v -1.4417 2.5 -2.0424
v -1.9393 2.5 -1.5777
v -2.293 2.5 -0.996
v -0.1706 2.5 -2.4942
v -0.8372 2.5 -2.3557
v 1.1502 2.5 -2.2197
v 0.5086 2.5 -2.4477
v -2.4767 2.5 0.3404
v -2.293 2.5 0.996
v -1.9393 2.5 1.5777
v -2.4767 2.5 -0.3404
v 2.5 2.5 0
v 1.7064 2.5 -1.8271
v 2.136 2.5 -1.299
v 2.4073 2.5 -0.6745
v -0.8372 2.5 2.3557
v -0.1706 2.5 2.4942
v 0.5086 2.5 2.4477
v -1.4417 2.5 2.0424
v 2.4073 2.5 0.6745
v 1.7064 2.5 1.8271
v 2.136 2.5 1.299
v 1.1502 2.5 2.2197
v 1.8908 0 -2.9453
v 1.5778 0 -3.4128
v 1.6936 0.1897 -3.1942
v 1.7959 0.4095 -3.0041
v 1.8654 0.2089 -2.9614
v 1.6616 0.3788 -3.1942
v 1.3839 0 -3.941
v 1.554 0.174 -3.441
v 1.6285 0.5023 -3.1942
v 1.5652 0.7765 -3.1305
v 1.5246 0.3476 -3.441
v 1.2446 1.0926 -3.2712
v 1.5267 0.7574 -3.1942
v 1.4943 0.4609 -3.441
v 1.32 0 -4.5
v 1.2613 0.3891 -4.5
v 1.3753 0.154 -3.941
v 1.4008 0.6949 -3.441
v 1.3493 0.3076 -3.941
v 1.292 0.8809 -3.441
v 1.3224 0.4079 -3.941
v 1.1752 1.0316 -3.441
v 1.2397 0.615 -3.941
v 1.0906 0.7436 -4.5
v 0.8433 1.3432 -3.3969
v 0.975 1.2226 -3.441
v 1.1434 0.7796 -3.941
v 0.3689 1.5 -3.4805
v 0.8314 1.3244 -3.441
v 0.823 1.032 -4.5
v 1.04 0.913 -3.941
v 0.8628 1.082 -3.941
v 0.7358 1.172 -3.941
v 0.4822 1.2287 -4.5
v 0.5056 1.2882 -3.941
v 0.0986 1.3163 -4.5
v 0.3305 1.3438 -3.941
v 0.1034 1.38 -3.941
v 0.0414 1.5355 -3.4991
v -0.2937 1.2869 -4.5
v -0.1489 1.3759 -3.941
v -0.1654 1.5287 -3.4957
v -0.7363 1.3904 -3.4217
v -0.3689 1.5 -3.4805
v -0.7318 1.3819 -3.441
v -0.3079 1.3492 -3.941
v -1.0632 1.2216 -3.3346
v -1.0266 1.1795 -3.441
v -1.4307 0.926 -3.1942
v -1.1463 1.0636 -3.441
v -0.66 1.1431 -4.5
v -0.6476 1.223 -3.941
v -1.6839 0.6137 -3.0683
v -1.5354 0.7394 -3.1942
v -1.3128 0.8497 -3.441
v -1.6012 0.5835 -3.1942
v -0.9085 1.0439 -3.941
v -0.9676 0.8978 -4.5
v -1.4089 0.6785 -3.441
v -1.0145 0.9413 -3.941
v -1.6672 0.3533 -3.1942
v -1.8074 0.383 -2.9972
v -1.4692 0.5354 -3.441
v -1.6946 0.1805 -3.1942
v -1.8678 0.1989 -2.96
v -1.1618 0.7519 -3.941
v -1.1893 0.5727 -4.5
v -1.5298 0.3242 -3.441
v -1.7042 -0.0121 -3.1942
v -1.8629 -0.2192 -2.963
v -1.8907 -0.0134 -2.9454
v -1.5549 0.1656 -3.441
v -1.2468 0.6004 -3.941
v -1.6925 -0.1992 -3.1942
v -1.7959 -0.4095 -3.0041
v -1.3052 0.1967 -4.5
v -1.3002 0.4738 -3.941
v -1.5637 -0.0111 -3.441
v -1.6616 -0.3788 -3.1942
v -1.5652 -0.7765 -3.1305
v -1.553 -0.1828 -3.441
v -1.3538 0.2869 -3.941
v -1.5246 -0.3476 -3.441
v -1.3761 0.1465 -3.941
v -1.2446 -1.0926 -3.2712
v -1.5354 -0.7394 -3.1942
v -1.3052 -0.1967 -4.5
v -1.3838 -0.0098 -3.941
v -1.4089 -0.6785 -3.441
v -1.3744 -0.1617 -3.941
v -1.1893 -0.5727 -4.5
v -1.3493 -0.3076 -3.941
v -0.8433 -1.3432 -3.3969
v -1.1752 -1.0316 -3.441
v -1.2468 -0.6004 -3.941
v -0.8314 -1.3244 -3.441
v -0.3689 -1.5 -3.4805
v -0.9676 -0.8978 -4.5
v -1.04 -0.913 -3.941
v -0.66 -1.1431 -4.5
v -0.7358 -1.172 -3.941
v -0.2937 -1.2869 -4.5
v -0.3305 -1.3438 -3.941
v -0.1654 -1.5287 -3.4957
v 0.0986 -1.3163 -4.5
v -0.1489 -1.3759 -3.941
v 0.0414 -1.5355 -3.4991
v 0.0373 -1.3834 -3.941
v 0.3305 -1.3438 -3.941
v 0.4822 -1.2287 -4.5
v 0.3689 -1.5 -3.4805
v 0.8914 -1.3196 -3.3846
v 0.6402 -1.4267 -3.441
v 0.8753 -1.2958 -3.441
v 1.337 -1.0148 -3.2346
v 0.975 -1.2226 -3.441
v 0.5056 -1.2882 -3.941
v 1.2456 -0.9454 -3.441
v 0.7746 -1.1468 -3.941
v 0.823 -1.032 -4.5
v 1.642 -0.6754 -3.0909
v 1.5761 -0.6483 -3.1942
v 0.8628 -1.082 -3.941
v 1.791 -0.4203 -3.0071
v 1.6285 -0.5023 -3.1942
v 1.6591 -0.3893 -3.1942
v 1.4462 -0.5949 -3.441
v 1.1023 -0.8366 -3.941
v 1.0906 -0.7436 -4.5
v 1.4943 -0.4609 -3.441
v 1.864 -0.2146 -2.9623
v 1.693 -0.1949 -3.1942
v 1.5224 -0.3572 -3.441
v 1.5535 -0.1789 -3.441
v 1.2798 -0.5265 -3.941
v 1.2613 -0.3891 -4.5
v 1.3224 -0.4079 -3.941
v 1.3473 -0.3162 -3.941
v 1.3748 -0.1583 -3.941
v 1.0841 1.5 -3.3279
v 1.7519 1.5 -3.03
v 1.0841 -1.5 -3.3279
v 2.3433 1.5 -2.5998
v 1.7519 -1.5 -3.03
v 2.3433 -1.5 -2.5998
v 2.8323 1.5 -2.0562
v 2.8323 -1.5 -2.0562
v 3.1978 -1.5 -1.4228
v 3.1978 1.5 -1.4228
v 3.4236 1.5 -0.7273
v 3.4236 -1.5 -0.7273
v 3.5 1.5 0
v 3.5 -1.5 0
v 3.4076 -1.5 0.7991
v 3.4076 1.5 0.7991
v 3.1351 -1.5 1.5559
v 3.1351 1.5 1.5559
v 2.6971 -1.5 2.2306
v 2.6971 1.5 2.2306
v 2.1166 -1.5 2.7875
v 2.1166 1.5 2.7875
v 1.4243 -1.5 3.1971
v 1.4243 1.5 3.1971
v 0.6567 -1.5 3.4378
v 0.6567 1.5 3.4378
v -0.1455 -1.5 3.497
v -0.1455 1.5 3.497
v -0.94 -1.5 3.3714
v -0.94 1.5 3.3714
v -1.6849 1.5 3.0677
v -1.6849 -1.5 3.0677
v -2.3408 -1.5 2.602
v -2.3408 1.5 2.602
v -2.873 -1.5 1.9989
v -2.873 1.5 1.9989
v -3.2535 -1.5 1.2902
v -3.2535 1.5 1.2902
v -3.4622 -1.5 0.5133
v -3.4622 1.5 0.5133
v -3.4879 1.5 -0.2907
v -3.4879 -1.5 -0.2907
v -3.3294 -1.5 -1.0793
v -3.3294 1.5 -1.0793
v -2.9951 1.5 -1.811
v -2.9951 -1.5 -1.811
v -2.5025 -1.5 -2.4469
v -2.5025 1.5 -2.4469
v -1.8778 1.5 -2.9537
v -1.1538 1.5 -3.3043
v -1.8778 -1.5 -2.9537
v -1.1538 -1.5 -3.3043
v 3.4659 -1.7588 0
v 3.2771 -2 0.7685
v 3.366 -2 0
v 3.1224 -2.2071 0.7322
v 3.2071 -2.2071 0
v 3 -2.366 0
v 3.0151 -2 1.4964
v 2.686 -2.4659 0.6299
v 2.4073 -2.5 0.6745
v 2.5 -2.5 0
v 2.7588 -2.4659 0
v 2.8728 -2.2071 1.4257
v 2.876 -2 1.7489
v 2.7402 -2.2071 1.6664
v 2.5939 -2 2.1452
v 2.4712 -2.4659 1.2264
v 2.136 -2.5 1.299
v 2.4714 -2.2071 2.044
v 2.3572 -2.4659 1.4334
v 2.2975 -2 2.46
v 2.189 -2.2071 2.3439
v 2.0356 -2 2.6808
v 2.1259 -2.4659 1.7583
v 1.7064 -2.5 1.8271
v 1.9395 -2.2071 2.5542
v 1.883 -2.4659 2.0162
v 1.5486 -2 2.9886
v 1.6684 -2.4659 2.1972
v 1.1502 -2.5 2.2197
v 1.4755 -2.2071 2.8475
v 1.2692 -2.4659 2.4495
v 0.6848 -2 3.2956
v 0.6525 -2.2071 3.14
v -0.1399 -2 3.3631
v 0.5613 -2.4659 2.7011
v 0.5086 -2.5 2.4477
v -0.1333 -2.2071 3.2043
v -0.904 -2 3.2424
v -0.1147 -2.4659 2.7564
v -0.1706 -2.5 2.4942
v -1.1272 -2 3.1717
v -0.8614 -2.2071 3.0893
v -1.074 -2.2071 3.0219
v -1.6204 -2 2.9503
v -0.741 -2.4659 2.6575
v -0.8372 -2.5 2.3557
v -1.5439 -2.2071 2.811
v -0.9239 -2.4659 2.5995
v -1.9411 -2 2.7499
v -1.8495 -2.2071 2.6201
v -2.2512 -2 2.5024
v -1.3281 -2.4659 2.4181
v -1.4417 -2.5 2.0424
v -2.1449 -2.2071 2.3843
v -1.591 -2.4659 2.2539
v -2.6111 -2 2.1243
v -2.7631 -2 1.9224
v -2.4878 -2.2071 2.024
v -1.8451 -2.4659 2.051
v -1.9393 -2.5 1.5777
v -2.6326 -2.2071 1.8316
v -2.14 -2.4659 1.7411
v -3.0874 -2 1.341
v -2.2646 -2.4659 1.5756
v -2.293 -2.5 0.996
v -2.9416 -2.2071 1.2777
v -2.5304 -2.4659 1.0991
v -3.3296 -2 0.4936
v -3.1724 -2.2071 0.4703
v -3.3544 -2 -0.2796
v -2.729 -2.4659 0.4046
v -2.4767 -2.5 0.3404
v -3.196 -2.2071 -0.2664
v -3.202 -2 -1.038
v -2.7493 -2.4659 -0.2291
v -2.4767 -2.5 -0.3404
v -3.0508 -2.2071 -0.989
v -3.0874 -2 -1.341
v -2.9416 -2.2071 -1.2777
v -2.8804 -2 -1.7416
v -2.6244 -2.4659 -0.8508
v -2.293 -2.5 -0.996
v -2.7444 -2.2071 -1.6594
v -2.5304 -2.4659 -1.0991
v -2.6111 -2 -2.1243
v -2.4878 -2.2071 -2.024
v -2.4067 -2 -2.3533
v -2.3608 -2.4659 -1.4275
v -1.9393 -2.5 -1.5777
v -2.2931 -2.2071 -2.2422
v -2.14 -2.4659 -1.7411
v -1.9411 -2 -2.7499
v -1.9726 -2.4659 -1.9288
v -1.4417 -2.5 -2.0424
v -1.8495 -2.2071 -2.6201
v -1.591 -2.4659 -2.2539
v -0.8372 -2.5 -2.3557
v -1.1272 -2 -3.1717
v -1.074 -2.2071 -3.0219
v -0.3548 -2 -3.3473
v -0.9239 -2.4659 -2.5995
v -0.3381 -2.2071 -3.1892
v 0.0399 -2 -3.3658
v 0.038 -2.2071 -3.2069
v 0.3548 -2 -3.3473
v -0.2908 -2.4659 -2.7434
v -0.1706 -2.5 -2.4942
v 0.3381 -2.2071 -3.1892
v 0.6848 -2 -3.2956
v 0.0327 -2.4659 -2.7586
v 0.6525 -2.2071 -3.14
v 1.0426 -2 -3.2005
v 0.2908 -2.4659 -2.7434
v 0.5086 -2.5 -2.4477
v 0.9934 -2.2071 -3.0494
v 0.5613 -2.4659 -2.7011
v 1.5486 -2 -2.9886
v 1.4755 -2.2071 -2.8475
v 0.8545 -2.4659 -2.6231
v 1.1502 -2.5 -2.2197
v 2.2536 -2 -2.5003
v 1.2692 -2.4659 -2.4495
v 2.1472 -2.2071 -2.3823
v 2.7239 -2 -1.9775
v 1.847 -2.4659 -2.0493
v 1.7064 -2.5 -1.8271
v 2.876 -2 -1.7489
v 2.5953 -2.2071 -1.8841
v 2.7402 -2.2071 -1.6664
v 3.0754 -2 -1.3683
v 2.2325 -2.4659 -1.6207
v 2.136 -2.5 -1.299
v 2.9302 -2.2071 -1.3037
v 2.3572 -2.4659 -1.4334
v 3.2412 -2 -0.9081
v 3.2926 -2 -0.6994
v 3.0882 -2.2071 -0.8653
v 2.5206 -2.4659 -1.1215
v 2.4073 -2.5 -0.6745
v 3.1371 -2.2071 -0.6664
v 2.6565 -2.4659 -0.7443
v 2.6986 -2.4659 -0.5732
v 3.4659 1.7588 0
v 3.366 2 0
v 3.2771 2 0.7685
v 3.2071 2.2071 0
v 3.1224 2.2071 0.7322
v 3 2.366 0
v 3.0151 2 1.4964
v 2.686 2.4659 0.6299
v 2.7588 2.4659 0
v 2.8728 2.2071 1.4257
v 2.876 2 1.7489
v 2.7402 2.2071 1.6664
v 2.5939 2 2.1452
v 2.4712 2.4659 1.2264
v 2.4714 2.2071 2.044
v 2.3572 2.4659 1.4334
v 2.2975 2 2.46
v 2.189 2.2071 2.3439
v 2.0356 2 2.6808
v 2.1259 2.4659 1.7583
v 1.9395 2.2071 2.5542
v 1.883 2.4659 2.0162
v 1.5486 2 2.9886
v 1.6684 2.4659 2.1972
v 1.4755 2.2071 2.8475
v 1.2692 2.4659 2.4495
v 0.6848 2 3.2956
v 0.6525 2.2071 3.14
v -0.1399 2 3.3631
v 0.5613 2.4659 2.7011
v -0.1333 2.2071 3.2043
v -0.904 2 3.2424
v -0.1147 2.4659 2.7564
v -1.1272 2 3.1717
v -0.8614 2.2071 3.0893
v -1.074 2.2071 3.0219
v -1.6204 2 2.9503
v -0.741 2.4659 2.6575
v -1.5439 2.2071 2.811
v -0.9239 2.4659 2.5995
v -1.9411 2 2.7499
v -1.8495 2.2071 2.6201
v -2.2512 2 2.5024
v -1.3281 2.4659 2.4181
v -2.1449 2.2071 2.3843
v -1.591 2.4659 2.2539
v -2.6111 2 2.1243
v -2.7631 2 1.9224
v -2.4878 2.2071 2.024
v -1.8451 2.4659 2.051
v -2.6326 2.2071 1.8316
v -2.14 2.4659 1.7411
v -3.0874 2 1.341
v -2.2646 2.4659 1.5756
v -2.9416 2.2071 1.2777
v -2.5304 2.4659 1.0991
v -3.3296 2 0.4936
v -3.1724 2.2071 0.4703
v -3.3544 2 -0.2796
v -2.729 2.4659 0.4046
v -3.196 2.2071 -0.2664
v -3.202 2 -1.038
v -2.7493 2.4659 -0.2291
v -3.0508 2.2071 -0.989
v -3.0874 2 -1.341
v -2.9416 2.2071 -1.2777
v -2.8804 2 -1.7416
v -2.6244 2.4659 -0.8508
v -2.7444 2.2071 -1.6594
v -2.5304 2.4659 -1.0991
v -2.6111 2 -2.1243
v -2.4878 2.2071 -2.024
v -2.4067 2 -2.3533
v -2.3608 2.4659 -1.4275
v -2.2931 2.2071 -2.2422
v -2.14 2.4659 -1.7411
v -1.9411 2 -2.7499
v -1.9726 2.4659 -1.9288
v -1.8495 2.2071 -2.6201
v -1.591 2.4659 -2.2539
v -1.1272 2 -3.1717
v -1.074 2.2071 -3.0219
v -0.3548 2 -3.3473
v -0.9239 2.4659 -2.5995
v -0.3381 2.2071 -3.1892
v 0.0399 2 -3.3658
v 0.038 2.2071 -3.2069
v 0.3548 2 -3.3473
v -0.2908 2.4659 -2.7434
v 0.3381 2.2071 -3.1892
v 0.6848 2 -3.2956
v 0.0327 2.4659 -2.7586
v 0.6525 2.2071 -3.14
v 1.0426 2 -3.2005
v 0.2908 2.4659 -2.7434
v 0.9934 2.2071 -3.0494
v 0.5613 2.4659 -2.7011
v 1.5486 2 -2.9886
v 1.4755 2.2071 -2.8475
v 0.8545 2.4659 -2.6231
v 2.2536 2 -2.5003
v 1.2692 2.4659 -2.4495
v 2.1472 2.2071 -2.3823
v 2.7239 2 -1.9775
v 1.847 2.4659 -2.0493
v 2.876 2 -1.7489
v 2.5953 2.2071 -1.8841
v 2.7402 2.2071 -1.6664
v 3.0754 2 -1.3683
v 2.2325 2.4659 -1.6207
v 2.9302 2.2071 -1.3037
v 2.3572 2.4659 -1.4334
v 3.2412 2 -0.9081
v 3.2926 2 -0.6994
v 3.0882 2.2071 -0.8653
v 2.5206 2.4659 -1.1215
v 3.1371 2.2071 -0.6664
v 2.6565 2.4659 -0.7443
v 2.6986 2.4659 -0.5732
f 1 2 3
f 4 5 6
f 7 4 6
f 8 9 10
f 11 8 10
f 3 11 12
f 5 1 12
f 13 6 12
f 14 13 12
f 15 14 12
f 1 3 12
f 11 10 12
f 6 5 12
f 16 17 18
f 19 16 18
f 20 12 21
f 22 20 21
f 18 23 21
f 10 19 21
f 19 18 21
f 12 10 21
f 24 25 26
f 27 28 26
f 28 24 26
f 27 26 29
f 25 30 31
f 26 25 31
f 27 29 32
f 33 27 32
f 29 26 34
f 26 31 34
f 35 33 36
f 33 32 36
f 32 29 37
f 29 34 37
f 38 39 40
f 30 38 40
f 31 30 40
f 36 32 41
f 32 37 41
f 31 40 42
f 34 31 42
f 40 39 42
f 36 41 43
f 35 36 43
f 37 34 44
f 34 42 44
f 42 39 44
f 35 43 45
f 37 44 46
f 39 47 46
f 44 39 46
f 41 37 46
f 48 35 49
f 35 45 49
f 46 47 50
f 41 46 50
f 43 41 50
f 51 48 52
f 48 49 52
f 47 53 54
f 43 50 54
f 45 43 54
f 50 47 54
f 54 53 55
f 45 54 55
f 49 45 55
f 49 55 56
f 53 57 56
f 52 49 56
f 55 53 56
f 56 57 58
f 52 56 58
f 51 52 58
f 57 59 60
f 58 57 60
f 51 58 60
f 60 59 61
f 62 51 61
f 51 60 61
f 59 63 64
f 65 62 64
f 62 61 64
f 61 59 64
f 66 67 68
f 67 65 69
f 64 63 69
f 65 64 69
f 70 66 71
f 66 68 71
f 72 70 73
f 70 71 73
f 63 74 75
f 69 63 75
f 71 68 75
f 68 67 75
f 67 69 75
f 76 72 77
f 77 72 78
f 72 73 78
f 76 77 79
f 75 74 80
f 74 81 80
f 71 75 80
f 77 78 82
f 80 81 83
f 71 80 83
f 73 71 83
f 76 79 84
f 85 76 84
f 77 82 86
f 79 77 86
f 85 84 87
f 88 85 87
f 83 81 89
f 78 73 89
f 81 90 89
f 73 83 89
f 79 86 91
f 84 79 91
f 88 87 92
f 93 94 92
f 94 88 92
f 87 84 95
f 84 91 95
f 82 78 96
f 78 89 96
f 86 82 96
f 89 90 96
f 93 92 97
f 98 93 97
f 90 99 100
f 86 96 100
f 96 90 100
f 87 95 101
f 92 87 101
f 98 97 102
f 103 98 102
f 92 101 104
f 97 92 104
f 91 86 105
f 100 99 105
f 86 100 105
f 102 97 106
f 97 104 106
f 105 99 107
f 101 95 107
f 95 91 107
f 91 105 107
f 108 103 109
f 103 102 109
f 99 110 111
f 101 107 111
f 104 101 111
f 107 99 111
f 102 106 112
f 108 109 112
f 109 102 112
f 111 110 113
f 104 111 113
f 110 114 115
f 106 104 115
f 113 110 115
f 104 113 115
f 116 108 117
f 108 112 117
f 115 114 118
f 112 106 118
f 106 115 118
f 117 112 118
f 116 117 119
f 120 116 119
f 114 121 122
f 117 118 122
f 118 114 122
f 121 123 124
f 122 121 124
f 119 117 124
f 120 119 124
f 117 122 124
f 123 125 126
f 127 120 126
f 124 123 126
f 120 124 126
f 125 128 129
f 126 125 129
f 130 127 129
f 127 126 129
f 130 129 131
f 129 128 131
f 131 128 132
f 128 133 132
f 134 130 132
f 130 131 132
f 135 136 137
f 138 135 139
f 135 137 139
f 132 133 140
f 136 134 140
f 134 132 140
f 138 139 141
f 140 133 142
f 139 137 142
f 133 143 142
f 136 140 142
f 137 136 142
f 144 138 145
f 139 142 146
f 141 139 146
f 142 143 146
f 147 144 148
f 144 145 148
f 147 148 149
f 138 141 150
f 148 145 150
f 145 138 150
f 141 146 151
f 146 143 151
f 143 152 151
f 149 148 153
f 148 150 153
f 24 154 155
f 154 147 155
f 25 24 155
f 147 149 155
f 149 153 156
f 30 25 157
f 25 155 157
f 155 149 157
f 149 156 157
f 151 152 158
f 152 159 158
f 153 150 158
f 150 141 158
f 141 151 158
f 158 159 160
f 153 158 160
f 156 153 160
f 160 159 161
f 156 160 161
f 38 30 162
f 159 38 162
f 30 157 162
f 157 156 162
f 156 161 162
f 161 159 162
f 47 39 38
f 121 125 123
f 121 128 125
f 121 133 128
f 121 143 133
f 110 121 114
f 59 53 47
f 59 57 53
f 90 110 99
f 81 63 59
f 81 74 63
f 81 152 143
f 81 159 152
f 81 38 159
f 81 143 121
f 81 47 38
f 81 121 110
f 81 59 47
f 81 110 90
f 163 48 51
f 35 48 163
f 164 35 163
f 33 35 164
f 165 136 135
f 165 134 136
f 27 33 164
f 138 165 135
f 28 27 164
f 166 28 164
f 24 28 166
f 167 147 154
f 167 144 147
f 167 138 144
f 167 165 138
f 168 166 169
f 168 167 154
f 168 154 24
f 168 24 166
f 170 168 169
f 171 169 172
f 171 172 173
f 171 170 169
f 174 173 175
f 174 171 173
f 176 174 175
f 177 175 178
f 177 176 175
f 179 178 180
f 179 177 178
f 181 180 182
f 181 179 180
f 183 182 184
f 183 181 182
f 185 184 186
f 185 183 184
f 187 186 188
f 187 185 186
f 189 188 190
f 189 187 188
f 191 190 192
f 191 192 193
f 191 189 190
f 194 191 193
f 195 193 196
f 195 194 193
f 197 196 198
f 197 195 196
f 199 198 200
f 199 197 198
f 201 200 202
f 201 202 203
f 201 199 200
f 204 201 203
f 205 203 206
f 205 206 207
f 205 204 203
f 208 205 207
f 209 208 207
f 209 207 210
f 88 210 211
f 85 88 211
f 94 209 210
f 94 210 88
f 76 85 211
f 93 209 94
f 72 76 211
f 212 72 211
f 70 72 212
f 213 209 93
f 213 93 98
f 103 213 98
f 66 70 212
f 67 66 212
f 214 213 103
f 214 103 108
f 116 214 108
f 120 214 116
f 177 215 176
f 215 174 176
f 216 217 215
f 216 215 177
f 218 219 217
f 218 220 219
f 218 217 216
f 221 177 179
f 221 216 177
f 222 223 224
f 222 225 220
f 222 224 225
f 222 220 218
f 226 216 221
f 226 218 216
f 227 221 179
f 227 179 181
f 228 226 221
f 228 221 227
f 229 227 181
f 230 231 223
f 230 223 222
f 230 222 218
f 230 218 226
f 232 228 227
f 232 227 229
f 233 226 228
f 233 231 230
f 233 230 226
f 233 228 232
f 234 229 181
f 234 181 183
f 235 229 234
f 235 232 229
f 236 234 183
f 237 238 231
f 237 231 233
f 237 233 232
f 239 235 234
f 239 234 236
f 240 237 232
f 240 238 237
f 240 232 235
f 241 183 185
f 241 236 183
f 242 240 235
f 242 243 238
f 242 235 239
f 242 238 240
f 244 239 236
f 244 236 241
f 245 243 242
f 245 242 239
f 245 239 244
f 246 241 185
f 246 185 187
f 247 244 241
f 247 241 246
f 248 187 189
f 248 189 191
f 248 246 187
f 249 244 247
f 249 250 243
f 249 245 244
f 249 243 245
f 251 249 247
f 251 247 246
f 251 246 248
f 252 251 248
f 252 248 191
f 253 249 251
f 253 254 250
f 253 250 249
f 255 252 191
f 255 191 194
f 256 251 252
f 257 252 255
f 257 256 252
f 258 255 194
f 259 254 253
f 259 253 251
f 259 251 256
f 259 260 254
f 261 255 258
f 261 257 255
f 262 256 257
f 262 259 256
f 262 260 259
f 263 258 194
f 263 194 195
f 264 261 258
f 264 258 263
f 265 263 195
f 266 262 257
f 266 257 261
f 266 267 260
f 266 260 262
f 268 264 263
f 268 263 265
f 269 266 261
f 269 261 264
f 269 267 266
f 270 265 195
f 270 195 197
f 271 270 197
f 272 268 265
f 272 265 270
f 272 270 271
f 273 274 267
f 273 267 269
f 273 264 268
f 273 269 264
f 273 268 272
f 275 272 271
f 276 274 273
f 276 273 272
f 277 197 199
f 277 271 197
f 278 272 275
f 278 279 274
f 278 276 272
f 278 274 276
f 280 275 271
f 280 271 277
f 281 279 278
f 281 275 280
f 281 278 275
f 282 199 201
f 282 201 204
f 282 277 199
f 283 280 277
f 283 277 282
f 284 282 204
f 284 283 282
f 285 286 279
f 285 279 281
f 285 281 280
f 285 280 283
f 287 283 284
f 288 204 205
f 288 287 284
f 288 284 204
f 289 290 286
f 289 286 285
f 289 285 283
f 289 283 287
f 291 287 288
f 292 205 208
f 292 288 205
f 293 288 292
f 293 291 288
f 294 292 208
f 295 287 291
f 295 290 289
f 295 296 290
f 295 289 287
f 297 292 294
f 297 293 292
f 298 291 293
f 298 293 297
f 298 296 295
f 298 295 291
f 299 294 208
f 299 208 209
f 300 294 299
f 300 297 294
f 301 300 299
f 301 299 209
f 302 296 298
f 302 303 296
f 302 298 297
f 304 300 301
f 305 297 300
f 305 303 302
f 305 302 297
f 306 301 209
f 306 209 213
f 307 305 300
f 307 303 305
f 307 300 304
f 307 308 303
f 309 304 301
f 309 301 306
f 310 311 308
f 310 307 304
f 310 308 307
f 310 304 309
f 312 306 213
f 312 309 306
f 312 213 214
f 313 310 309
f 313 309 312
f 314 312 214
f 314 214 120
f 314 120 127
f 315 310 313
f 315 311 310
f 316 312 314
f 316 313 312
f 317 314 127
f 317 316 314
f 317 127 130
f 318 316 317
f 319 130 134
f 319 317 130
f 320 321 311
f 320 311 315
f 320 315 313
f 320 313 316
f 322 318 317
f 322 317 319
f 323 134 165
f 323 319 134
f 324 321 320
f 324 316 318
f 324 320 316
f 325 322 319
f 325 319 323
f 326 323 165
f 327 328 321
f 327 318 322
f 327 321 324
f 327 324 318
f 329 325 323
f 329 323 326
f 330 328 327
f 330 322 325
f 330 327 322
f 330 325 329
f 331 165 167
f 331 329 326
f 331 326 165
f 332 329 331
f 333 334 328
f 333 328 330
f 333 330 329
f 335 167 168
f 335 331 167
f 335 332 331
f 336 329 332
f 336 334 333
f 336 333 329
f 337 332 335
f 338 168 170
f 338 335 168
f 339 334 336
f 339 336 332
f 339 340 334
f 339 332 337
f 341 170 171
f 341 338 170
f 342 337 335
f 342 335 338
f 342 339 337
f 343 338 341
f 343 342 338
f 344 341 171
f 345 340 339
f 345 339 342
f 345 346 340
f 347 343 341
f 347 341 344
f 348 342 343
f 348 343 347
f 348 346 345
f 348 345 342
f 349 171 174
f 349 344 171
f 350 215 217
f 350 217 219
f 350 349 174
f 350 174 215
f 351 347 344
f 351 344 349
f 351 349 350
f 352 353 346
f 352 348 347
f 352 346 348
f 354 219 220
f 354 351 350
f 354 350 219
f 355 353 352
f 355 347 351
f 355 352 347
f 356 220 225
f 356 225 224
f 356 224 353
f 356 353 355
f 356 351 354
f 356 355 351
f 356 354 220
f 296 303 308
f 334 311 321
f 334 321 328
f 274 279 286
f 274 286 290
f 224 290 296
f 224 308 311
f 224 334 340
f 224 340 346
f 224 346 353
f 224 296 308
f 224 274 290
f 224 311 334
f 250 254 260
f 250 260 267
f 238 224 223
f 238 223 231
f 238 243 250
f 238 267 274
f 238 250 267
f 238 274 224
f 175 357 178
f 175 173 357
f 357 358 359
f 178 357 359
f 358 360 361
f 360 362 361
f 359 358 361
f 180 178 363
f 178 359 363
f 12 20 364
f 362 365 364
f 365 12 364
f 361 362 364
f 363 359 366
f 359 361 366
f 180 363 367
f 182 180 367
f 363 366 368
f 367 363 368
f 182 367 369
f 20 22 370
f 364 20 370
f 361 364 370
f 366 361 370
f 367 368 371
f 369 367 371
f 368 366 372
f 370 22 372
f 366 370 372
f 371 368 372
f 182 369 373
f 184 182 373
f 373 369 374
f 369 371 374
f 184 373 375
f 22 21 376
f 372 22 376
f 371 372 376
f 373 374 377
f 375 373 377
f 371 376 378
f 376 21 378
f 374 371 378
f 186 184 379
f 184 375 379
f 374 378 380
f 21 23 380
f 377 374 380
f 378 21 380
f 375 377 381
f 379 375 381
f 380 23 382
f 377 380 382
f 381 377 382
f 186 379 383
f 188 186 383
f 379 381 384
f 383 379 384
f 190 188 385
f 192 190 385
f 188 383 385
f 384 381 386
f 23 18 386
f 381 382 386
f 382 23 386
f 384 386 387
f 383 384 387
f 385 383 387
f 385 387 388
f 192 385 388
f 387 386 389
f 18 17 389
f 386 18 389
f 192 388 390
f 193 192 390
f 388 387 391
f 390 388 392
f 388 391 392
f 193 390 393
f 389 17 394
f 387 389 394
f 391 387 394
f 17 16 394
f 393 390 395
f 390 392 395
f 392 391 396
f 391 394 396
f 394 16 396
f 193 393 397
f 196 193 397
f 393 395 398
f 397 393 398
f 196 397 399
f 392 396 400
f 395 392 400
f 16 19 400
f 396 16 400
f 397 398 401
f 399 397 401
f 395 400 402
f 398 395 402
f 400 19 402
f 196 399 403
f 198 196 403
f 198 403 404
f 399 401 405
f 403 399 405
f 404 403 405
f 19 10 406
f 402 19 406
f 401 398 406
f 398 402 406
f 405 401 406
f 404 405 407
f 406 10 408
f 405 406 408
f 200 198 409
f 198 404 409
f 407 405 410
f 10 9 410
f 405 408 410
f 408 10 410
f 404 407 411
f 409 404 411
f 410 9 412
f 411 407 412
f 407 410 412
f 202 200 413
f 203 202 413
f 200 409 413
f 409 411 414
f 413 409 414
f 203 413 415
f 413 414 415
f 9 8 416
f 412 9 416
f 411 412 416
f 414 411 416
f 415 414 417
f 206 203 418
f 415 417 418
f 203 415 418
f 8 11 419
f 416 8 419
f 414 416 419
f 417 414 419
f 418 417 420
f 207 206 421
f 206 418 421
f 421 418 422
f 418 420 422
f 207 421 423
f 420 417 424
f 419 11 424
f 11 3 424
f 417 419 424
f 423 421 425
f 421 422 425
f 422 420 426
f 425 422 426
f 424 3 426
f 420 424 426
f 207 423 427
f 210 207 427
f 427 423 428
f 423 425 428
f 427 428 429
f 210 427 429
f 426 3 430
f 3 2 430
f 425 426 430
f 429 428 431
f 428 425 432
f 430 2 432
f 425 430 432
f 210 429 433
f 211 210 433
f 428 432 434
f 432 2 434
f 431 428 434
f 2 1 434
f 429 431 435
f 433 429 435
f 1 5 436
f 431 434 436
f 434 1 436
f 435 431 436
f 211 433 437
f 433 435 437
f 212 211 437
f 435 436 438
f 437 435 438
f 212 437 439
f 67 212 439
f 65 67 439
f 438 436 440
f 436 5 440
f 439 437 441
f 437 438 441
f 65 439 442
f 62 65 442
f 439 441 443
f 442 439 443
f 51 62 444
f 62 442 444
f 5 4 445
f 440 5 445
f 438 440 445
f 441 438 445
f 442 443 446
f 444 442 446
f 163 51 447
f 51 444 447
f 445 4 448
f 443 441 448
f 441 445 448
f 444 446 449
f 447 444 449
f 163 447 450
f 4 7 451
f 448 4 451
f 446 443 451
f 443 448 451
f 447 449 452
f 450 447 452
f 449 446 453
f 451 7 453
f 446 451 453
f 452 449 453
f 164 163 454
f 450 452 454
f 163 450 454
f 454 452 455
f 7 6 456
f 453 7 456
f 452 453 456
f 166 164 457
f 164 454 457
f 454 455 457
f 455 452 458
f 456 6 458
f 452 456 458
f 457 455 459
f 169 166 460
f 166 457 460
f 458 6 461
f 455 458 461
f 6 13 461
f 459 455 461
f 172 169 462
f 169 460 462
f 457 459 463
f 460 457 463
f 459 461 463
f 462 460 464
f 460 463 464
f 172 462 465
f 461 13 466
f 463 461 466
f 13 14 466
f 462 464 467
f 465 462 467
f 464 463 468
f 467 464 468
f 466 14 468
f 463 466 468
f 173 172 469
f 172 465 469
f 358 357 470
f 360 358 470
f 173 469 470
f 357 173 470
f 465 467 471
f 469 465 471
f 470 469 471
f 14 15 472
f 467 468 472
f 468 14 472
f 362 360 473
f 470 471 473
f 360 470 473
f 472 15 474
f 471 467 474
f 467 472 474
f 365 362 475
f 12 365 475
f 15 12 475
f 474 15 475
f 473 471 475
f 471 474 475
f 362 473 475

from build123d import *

# Parameters (mm, degrees)
SKETCH_R       = 3.5
PAD_DEPTH      = 2.5
PAD_DEPTH_BACK = 2.5
FILLET_R       = 1
FILLET001_R    = 1


with BuildPart() as part:
    # Sketch → Pad (new body, two sides)
    with BuildSketch(Plane.XZ) as pad_sk:
        Circle(SKETCH_R)
    extrude(amount=PAD_DEPTH)
    extrude(pad_sk.sketch, amount=-PAD_DEPTH_BACK)

    # Fillet
    fillet_edges = [part.edges().sort_by_distance(p)[0] for p in [
        (-3.5, -2.5, 0),
    ]]
    fillet(fillet_edges, radius=FILLET_R)

    # Fillet001
    fillet001_edges = [part.edges().sort_by_distance(p)[0] for p in [
        (-3.5, 2.5, 0),
    ]]
    fillet(fillet001_edges, radius=FILLET001_R)

    # Sketch001 → Revolution (revolve)
    with BuildSketch(Plane.XZ):
        with BuildLine():
            Line((0, -2.5), (2.4, -2.5))
            ThreePointArc((2.4, -2.5), (1.604465, -3.362015), (1.319973, -4.5))
            Line((0, -4.5), (1.319973, -4.5))
            Line((0, -2.5), (0, -4.5))
        make_face()
    revolve(axis=Axis((0, 0, 0), (0, 0, 1)))


solid = part.part
